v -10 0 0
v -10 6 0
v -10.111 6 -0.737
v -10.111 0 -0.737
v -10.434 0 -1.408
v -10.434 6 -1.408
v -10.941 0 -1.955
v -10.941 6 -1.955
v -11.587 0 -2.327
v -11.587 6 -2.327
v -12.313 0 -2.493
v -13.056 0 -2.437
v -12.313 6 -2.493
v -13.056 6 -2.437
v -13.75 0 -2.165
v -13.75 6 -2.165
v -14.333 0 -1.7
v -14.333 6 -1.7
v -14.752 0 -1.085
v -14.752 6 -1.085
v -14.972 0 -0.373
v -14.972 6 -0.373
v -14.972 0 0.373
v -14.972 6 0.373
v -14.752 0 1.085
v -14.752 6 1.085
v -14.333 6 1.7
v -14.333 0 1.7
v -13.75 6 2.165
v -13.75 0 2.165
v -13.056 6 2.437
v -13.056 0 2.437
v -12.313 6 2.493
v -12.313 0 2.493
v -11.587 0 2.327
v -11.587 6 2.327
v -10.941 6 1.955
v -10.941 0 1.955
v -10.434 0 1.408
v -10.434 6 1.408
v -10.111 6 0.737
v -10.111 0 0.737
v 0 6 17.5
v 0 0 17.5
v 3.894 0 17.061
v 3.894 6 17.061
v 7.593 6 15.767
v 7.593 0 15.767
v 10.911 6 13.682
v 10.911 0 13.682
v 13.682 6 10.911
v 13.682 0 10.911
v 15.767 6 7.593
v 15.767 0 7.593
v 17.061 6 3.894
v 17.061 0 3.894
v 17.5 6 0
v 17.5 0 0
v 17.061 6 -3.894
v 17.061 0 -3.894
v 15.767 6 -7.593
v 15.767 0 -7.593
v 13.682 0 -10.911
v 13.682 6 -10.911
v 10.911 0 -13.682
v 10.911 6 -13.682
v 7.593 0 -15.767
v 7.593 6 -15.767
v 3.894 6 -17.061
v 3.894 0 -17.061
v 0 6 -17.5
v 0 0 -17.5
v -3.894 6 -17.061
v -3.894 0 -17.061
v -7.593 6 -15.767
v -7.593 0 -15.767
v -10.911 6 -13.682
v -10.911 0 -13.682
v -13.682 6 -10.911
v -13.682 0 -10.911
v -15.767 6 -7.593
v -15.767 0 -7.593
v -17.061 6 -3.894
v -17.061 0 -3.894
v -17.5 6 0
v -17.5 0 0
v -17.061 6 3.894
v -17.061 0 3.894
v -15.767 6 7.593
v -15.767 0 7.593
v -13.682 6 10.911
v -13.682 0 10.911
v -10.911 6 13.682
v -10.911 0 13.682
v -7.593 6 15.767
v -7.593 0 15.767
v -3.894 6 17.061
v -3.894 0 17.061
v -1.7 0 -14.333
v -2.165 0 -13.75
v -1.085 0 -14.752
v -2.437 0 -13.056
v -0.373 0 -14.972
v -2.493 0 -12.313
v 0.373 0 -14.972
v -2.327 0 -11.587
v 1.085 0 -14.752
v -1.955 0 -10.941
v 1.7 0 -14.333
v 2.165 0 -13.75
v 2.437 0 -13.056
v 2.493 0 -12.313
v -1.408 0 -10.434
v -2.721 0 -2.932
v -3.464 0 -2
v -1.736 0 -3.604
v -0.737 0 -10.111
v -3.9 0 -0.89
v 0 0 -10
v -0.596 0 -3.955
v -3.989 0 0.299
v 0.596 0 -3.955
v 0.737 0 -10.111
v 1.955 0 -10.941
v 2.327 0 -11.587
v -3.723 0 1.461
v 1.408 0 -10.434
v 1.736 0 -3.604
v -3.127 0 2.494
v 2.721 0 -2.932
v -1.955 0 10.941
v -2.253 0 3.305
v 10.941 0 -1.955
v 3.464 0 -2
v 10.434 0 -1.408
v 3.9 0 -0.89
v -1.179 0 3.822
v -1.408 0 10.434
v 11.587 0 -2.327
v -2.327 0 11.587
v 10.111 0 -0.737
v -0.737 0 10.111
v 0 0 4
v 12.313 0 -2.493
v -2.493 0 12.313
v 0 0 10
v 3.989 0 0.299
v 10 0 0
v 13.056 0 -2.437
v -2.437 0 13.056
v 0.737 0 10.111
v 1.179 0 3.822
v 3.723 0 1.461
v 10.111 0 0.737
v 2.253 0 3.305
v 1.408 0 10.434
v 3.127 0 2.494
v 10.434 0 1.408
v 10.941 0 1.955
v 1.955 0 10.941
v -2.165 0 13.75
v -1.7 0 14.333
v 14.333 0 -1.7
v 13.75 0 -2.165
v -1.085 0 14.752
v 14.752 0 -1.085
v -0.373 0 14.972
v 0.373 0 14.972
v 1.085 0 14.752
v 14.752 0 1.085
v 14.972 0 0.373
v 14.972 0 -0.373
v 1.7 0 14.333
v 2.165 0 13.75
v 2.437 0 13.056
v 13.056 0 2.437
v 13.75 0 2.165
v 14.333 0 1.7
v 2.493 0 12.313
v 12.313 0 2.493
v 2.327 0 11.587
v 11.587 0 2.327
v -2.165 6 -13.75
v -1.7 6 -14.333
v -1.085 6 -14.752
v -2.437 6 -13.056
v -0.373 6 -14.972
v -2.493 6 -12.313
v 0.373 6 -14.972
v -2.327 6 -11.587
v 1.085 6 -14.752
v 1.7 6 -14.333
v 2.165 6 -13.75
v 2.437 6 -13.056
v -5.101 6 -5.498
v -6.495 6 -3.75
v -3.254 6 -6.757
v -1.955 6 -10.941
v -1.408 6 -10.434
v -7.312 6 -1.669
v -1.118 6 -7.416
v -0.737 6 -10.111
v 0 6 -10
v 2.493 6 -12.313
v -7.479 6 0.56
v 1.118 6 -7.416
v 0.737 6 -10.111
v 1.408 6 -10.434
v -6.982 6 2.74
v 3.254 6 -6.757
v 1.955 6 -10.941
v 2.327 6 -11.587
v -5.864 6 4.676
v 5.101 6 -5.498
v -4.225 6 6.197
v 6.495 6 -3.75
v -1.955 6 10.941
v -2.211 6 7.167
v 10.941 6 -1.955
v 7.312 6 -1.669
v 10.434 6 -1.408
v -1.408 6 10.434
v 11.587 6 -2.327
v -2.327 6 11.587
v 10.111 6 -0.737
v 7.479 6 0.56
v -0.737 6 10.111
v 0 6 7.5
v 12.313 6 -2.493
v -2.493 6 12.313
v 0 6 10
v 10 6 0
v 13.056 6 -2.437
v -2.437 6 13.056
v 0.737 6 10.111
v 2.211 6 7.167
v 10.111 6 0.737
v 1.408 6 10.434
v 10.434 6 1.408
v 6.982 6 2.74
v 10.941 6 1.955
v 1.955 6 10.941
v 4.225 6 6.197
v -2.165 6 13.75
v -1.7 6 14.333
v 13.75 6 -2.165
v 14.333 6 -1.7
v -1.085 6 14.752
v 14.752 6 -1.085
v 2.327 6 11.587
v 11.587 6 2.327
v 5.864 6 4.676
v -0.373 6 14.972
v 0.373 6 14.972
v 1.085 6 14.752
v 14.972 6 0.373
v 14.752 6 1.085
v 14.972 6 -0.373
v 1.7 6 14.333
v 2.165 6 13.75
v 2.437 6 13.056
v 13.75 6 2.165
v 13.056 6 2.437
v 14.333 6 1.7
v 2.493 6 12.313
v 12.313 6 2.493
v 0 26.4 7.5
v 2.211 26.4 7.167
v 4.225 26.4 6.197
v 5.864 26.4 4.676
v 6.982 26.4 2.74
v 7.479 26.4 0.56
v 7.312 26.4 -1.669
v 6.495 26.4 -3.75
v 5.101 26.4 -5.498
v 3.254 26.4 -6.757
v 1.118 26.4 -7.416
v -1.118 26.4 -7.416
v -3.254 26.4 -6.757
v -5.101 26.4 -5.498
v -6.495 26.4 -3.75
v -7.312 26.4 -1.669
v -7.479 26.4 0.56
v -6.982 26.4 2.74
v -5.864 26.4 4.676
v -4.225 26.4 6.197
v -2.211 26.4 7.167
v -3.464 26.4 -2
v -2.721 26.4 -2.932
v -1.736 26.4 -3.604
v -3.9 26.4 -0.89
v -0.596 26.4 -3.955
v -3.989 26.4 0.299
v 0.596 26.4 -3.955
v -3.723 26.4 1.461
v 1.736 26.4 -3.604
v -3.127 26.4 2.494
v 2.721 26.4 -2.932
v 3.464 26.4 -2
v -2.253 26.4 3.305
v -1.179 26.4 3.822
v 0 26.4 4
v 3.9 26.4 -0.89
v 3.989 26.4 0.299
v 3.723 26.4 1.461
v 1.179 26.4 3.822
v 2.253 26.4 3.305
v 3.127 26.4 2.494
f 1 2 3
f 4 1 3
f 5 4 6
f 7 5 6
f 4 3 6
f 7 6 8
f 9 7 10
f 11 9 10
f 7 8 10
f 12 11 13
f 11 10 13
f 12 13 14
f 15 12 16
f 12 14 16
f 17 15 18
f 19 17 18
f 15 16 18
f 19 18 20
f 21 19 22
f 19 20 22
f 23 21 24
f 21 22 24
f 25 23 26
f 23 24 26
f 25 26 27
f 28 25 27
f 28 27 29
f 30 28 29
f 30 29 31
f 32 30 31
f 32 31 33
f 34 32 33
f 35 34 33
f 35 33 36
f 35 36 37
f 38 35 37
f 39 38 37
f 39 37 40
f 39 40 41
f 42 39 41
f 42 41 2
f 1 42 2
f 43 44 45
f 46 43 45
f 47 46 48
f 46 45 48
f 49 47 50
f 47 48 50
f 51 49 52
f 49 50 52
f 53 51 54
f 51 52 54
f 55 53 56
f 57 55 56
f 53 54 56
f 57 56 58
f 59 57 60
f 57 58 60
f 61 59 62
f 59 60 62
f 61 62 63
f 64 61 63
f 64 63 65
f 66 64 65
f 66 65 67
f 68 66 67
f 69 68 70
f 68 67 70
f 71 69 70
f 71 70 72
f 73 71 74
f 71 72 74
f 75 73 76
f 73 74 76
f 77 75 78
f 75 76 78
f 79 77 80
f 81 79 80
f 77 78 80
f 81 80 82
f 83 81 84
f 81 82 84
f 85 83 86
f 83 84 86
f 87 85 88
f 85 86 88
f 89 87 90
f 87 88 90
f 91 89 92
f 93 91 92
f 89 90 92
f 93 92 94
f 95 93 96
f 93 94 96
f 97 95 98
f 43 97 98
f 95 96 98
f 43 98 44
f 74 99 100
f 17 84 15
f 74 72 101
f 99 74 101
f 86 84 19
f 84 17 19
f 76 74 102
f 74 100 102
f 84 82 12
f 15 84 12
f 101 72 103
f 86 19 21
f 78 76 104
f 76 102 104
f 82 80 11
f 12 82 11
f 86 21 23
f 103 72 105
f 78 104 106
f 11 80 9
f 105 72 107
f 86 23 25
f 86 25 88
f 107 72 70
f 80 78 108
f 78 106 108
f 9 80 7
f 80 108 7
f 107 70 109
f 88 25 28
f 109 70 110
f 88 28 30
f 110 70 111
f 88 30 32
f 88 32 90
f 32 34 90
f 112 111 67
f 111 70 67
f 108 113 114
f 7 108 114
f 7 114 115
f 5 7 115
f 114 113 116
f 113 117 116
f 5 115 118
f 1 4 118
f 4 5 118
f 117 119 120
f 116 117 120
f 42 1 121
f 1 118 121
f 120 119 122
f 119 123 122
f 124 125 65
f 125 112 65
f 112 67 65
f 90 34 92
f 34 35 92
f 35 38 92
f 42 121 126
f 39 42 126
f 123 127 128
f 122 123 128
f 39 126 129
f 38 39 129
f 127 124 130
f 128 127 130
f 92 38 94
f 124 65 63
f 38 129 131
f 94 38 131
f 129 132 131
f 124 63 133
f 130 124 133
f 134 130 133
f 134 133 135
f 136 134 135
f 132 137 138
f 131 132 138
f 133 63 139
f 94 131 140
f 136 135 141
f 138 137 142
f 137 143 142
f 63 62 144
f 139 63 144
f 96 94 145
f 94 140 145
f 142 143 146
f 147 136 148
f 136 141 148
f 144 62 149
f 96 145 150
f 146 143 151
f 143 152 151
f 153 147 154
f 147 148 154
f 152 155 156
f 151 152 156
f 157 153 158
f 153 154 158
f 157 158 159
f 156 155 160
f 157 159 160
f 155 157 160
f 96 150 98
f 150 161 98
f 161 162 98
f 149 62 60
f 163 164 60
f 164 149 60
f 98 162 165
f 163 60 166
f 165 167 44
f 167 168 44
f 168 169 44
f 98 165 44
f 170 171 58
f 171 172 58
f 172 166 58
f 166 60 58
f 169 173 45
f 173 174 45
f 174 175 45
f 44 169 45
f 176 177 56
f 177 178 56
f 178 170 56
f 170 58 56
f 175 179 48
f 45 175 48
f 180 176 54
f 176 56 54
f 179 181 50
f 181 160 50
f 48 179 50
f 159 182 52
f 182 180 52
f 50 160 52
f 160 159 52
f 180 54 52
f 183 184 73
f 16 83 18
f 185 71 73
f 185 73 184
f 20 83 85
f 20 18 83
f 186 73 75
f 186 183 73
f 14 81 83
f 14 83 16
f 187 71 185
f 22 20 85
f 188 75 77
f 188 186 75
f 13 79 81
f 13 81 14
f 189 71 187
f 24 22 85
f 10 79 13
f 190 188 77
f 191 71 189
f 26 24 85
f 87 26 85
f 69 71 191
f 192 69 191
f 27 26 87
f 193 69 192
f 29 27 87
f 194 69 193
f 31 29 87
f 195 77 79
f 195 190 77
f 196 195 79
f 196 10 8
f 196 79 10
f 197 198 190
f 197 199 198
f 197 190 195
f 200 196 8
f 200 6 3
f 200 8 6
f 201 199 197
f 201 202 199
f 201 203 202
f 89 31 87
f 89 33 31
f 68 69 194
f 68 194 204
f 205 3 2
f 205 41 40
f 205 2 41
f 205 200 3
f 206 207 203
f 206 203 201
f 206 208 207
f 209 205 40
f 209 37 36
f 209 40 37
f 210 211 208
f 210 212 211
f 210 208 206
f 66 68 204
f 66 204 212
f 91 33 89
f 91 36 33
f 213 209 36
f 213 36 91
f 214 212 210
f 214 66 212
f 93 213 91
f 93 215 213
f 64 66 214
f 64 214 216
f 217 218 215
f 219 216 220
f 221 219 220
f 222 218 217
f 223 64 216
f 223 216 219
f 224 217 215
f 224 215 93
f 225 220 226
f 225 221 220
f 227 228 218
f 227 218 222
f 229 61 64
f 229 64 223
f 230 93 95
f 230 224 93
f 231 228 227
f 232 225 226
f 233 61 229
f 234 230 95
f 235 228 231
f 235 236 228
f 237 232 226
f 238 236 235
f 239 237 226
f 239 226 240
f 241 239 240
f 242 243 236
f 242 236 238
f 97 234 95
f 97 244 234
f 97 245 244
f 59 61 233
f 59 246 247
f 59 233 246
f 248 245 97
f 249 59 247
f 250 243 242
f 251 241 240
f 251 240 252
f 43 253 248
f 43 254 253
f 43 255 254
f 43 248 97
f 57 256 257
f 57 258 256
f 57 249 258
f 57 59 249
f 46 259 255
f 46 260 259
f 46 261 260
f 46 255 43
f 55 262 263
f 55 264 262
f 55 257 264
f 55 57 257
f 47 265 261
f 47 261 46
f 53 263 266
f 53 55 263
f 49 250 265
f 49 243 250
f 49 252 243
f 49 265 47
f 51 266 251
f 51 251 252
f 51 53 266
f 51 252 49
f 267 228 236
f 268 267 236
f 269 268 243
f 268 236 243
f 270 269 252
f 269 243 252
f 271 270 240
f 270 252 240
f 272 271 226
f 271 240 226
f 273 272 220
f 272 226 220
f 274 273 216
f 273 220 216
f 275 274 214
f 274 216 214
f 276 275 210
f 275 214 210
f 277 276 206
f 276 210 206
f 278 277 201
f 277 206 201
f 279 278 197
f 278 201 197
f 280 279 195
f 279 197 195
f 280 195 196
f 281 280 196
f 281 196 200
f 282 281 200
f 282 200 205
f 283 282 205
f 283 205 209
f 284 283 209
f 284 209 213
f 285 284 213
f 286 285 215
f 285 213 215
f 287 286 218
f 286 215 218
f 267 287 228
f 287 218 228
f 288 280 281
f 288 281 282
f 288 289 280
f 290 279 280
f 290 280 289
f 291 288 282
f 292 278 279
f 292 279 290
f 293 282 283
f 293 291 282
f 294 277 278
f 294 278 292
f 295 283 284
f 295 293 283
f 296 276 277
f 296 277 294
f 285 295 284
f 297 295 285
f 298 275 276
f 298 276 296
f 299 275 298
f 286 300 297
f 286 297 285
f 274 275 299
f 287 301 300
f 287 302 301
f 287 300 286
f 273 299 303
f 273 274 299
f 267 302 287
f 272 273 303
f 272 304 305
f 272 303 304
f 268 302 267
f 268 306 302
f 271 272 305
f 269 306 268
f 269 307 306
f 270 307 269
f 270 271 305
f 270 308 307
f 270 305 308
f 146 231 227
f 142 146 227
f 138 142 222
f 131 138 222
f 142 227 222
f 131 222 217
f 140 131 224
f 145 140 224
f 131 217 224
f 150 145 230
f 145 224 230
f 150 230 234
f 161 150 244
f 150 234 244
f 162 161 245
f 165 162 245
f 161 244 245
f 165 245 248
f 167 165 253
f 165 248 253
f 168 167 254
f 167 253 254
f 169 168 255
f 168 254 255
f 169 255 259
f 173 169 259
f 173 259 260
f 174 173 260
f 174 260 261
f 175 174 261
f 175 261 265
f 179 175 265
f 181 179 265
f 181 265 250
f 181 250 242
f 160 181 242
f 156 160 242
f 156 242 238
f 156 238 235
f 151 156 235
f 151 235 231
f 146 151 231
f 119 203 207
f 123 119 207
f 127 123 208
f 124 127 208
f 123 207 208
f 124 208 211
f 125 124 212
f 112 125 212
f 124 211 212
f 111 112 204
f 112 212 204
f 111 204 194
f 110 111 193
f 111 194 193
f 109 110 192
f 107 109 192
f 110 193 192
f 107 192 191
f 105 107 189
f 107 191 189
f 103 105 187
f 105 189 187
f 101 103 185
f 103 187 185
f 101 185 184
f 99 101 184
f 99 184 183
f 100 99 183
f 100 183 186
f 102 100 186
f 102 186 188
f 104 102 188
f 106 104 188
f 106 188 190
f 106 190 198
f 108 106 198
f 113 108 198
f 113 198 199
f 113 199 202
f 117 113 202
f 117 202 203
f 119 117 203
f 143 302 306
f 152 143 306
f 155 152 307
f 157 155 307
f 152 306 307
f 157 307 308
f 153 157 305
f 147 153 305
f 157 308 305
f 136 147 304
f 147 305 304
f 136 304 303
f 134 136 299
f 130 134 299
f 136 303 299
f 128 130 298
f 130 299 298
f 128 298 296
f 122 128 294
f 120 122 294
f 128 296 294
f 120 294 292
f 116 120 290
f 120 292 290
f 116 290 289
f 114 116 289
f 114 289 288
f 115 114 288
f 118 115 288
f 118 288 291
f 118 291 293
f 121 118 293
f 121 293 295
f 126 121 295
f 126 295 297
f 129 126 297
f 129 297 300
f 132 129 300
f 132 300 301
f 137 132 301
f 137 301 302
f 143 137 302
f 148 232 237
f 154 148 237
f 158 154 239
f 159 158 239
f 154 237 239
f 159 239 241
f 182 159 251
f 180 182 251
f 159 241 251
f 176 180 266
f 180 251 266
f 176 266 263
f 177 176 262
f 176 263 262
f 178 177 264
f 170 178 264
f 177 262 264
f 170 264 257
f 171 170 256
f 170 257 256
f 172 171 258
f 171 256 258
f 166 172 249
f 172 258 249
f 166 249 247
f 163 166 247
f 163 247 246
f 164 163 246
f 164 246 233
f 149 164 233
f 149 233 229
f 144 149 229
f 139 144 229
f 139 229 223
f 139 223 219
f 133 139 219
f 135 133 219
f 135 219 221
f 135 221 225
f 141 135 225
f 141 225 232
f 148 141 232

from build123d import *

# Parameters (mm, degrees)
SKETCH_1_R               = 17.5
EXTRUDE_1_DEPTH          = 6
SKETCH_3_R               = 7.5
EXTRUDE_2_DEPTH          = 20.4
SKETCH_4_R               = 4
CUT_EXTRUDE_1_DEPTH      = 37.186461557
SKETCH_5_R               = 2.5
CUT_EXTRUDE_2_DEPTH      = 10
PATTERN_CIRCULAR_1_COUNT = 4


with BuildPart() as part:
    # 草图1 → 凸台-拉伸1 (new body)
    with BuildSketch(Plane(origin=(0, 0, 0), x_dir=(1, 0, 0), z_dir=(0, 1, 0))):
        with Locations(Location((0, 0, 0), (0, 0, 270))):
            Circle(SKETCH_1_R)
    extrude(amount=EXTRUDE_1_DEPTH)

    # 草图3 → 凸台-拉伸2 (add)
    with BuildSketch(Plane(origin=(0, 6, 0), x_dir=(1, 0, 0), z_dir=(0, 1, 0))):
        with Locations(Location((0, 0, 0), (0, 0, 270))):
            Circle(SKETCH_3_R)
    extrude(amount=EXTRUDE_2_DEPTH)

    # 草图4 → 切除-拉伸1 (cut, through all)
    with BuildSketch(Plane(origin=(0, 26.4, 0), x_dir=(1, 0, 0), z_dir=(0, 1, 0))):
        with Locations(Location((0, 0, 0), (0, 0, 270))):
            Circle(SKETCH_4_R)
    extrude(amount=-CUT_EXTRUDE_1_DEPTH, mode=Mode.SUBTRACT)

    # 草图5 → 切除-拉伸2 (cut)
    with BuildSketch(Plane(origin=(0, 6, 0), x_dir=(1, 0, 0), z_dir=(0, 1, 0))):
        with Locations(Location((0, 12.5, 0), (0, 0, 270))):
            Circle(SKETCH_5_R)
    cut_extrude_2 = extrude(amount=-CUT_EXTRUDE_2_DEPTH, mode=Mode.SUBTRACT)

    # 阵列(圆周)1: 切除-拉伸2 ×4 about axis
    pattern_circular_1_axis = Axis((0, 0, 0), (0, 1, 0))
    for i in range(1, PATTERN_CIRCULAR_1_COUNT):
        add(cut_extrude_2.rotate(pattern_circular_1_axis, i * 360 / PATTERN_CIRCULAR_1_COUNT), mode=Mode.SUBTRACT)


solid = part.part
